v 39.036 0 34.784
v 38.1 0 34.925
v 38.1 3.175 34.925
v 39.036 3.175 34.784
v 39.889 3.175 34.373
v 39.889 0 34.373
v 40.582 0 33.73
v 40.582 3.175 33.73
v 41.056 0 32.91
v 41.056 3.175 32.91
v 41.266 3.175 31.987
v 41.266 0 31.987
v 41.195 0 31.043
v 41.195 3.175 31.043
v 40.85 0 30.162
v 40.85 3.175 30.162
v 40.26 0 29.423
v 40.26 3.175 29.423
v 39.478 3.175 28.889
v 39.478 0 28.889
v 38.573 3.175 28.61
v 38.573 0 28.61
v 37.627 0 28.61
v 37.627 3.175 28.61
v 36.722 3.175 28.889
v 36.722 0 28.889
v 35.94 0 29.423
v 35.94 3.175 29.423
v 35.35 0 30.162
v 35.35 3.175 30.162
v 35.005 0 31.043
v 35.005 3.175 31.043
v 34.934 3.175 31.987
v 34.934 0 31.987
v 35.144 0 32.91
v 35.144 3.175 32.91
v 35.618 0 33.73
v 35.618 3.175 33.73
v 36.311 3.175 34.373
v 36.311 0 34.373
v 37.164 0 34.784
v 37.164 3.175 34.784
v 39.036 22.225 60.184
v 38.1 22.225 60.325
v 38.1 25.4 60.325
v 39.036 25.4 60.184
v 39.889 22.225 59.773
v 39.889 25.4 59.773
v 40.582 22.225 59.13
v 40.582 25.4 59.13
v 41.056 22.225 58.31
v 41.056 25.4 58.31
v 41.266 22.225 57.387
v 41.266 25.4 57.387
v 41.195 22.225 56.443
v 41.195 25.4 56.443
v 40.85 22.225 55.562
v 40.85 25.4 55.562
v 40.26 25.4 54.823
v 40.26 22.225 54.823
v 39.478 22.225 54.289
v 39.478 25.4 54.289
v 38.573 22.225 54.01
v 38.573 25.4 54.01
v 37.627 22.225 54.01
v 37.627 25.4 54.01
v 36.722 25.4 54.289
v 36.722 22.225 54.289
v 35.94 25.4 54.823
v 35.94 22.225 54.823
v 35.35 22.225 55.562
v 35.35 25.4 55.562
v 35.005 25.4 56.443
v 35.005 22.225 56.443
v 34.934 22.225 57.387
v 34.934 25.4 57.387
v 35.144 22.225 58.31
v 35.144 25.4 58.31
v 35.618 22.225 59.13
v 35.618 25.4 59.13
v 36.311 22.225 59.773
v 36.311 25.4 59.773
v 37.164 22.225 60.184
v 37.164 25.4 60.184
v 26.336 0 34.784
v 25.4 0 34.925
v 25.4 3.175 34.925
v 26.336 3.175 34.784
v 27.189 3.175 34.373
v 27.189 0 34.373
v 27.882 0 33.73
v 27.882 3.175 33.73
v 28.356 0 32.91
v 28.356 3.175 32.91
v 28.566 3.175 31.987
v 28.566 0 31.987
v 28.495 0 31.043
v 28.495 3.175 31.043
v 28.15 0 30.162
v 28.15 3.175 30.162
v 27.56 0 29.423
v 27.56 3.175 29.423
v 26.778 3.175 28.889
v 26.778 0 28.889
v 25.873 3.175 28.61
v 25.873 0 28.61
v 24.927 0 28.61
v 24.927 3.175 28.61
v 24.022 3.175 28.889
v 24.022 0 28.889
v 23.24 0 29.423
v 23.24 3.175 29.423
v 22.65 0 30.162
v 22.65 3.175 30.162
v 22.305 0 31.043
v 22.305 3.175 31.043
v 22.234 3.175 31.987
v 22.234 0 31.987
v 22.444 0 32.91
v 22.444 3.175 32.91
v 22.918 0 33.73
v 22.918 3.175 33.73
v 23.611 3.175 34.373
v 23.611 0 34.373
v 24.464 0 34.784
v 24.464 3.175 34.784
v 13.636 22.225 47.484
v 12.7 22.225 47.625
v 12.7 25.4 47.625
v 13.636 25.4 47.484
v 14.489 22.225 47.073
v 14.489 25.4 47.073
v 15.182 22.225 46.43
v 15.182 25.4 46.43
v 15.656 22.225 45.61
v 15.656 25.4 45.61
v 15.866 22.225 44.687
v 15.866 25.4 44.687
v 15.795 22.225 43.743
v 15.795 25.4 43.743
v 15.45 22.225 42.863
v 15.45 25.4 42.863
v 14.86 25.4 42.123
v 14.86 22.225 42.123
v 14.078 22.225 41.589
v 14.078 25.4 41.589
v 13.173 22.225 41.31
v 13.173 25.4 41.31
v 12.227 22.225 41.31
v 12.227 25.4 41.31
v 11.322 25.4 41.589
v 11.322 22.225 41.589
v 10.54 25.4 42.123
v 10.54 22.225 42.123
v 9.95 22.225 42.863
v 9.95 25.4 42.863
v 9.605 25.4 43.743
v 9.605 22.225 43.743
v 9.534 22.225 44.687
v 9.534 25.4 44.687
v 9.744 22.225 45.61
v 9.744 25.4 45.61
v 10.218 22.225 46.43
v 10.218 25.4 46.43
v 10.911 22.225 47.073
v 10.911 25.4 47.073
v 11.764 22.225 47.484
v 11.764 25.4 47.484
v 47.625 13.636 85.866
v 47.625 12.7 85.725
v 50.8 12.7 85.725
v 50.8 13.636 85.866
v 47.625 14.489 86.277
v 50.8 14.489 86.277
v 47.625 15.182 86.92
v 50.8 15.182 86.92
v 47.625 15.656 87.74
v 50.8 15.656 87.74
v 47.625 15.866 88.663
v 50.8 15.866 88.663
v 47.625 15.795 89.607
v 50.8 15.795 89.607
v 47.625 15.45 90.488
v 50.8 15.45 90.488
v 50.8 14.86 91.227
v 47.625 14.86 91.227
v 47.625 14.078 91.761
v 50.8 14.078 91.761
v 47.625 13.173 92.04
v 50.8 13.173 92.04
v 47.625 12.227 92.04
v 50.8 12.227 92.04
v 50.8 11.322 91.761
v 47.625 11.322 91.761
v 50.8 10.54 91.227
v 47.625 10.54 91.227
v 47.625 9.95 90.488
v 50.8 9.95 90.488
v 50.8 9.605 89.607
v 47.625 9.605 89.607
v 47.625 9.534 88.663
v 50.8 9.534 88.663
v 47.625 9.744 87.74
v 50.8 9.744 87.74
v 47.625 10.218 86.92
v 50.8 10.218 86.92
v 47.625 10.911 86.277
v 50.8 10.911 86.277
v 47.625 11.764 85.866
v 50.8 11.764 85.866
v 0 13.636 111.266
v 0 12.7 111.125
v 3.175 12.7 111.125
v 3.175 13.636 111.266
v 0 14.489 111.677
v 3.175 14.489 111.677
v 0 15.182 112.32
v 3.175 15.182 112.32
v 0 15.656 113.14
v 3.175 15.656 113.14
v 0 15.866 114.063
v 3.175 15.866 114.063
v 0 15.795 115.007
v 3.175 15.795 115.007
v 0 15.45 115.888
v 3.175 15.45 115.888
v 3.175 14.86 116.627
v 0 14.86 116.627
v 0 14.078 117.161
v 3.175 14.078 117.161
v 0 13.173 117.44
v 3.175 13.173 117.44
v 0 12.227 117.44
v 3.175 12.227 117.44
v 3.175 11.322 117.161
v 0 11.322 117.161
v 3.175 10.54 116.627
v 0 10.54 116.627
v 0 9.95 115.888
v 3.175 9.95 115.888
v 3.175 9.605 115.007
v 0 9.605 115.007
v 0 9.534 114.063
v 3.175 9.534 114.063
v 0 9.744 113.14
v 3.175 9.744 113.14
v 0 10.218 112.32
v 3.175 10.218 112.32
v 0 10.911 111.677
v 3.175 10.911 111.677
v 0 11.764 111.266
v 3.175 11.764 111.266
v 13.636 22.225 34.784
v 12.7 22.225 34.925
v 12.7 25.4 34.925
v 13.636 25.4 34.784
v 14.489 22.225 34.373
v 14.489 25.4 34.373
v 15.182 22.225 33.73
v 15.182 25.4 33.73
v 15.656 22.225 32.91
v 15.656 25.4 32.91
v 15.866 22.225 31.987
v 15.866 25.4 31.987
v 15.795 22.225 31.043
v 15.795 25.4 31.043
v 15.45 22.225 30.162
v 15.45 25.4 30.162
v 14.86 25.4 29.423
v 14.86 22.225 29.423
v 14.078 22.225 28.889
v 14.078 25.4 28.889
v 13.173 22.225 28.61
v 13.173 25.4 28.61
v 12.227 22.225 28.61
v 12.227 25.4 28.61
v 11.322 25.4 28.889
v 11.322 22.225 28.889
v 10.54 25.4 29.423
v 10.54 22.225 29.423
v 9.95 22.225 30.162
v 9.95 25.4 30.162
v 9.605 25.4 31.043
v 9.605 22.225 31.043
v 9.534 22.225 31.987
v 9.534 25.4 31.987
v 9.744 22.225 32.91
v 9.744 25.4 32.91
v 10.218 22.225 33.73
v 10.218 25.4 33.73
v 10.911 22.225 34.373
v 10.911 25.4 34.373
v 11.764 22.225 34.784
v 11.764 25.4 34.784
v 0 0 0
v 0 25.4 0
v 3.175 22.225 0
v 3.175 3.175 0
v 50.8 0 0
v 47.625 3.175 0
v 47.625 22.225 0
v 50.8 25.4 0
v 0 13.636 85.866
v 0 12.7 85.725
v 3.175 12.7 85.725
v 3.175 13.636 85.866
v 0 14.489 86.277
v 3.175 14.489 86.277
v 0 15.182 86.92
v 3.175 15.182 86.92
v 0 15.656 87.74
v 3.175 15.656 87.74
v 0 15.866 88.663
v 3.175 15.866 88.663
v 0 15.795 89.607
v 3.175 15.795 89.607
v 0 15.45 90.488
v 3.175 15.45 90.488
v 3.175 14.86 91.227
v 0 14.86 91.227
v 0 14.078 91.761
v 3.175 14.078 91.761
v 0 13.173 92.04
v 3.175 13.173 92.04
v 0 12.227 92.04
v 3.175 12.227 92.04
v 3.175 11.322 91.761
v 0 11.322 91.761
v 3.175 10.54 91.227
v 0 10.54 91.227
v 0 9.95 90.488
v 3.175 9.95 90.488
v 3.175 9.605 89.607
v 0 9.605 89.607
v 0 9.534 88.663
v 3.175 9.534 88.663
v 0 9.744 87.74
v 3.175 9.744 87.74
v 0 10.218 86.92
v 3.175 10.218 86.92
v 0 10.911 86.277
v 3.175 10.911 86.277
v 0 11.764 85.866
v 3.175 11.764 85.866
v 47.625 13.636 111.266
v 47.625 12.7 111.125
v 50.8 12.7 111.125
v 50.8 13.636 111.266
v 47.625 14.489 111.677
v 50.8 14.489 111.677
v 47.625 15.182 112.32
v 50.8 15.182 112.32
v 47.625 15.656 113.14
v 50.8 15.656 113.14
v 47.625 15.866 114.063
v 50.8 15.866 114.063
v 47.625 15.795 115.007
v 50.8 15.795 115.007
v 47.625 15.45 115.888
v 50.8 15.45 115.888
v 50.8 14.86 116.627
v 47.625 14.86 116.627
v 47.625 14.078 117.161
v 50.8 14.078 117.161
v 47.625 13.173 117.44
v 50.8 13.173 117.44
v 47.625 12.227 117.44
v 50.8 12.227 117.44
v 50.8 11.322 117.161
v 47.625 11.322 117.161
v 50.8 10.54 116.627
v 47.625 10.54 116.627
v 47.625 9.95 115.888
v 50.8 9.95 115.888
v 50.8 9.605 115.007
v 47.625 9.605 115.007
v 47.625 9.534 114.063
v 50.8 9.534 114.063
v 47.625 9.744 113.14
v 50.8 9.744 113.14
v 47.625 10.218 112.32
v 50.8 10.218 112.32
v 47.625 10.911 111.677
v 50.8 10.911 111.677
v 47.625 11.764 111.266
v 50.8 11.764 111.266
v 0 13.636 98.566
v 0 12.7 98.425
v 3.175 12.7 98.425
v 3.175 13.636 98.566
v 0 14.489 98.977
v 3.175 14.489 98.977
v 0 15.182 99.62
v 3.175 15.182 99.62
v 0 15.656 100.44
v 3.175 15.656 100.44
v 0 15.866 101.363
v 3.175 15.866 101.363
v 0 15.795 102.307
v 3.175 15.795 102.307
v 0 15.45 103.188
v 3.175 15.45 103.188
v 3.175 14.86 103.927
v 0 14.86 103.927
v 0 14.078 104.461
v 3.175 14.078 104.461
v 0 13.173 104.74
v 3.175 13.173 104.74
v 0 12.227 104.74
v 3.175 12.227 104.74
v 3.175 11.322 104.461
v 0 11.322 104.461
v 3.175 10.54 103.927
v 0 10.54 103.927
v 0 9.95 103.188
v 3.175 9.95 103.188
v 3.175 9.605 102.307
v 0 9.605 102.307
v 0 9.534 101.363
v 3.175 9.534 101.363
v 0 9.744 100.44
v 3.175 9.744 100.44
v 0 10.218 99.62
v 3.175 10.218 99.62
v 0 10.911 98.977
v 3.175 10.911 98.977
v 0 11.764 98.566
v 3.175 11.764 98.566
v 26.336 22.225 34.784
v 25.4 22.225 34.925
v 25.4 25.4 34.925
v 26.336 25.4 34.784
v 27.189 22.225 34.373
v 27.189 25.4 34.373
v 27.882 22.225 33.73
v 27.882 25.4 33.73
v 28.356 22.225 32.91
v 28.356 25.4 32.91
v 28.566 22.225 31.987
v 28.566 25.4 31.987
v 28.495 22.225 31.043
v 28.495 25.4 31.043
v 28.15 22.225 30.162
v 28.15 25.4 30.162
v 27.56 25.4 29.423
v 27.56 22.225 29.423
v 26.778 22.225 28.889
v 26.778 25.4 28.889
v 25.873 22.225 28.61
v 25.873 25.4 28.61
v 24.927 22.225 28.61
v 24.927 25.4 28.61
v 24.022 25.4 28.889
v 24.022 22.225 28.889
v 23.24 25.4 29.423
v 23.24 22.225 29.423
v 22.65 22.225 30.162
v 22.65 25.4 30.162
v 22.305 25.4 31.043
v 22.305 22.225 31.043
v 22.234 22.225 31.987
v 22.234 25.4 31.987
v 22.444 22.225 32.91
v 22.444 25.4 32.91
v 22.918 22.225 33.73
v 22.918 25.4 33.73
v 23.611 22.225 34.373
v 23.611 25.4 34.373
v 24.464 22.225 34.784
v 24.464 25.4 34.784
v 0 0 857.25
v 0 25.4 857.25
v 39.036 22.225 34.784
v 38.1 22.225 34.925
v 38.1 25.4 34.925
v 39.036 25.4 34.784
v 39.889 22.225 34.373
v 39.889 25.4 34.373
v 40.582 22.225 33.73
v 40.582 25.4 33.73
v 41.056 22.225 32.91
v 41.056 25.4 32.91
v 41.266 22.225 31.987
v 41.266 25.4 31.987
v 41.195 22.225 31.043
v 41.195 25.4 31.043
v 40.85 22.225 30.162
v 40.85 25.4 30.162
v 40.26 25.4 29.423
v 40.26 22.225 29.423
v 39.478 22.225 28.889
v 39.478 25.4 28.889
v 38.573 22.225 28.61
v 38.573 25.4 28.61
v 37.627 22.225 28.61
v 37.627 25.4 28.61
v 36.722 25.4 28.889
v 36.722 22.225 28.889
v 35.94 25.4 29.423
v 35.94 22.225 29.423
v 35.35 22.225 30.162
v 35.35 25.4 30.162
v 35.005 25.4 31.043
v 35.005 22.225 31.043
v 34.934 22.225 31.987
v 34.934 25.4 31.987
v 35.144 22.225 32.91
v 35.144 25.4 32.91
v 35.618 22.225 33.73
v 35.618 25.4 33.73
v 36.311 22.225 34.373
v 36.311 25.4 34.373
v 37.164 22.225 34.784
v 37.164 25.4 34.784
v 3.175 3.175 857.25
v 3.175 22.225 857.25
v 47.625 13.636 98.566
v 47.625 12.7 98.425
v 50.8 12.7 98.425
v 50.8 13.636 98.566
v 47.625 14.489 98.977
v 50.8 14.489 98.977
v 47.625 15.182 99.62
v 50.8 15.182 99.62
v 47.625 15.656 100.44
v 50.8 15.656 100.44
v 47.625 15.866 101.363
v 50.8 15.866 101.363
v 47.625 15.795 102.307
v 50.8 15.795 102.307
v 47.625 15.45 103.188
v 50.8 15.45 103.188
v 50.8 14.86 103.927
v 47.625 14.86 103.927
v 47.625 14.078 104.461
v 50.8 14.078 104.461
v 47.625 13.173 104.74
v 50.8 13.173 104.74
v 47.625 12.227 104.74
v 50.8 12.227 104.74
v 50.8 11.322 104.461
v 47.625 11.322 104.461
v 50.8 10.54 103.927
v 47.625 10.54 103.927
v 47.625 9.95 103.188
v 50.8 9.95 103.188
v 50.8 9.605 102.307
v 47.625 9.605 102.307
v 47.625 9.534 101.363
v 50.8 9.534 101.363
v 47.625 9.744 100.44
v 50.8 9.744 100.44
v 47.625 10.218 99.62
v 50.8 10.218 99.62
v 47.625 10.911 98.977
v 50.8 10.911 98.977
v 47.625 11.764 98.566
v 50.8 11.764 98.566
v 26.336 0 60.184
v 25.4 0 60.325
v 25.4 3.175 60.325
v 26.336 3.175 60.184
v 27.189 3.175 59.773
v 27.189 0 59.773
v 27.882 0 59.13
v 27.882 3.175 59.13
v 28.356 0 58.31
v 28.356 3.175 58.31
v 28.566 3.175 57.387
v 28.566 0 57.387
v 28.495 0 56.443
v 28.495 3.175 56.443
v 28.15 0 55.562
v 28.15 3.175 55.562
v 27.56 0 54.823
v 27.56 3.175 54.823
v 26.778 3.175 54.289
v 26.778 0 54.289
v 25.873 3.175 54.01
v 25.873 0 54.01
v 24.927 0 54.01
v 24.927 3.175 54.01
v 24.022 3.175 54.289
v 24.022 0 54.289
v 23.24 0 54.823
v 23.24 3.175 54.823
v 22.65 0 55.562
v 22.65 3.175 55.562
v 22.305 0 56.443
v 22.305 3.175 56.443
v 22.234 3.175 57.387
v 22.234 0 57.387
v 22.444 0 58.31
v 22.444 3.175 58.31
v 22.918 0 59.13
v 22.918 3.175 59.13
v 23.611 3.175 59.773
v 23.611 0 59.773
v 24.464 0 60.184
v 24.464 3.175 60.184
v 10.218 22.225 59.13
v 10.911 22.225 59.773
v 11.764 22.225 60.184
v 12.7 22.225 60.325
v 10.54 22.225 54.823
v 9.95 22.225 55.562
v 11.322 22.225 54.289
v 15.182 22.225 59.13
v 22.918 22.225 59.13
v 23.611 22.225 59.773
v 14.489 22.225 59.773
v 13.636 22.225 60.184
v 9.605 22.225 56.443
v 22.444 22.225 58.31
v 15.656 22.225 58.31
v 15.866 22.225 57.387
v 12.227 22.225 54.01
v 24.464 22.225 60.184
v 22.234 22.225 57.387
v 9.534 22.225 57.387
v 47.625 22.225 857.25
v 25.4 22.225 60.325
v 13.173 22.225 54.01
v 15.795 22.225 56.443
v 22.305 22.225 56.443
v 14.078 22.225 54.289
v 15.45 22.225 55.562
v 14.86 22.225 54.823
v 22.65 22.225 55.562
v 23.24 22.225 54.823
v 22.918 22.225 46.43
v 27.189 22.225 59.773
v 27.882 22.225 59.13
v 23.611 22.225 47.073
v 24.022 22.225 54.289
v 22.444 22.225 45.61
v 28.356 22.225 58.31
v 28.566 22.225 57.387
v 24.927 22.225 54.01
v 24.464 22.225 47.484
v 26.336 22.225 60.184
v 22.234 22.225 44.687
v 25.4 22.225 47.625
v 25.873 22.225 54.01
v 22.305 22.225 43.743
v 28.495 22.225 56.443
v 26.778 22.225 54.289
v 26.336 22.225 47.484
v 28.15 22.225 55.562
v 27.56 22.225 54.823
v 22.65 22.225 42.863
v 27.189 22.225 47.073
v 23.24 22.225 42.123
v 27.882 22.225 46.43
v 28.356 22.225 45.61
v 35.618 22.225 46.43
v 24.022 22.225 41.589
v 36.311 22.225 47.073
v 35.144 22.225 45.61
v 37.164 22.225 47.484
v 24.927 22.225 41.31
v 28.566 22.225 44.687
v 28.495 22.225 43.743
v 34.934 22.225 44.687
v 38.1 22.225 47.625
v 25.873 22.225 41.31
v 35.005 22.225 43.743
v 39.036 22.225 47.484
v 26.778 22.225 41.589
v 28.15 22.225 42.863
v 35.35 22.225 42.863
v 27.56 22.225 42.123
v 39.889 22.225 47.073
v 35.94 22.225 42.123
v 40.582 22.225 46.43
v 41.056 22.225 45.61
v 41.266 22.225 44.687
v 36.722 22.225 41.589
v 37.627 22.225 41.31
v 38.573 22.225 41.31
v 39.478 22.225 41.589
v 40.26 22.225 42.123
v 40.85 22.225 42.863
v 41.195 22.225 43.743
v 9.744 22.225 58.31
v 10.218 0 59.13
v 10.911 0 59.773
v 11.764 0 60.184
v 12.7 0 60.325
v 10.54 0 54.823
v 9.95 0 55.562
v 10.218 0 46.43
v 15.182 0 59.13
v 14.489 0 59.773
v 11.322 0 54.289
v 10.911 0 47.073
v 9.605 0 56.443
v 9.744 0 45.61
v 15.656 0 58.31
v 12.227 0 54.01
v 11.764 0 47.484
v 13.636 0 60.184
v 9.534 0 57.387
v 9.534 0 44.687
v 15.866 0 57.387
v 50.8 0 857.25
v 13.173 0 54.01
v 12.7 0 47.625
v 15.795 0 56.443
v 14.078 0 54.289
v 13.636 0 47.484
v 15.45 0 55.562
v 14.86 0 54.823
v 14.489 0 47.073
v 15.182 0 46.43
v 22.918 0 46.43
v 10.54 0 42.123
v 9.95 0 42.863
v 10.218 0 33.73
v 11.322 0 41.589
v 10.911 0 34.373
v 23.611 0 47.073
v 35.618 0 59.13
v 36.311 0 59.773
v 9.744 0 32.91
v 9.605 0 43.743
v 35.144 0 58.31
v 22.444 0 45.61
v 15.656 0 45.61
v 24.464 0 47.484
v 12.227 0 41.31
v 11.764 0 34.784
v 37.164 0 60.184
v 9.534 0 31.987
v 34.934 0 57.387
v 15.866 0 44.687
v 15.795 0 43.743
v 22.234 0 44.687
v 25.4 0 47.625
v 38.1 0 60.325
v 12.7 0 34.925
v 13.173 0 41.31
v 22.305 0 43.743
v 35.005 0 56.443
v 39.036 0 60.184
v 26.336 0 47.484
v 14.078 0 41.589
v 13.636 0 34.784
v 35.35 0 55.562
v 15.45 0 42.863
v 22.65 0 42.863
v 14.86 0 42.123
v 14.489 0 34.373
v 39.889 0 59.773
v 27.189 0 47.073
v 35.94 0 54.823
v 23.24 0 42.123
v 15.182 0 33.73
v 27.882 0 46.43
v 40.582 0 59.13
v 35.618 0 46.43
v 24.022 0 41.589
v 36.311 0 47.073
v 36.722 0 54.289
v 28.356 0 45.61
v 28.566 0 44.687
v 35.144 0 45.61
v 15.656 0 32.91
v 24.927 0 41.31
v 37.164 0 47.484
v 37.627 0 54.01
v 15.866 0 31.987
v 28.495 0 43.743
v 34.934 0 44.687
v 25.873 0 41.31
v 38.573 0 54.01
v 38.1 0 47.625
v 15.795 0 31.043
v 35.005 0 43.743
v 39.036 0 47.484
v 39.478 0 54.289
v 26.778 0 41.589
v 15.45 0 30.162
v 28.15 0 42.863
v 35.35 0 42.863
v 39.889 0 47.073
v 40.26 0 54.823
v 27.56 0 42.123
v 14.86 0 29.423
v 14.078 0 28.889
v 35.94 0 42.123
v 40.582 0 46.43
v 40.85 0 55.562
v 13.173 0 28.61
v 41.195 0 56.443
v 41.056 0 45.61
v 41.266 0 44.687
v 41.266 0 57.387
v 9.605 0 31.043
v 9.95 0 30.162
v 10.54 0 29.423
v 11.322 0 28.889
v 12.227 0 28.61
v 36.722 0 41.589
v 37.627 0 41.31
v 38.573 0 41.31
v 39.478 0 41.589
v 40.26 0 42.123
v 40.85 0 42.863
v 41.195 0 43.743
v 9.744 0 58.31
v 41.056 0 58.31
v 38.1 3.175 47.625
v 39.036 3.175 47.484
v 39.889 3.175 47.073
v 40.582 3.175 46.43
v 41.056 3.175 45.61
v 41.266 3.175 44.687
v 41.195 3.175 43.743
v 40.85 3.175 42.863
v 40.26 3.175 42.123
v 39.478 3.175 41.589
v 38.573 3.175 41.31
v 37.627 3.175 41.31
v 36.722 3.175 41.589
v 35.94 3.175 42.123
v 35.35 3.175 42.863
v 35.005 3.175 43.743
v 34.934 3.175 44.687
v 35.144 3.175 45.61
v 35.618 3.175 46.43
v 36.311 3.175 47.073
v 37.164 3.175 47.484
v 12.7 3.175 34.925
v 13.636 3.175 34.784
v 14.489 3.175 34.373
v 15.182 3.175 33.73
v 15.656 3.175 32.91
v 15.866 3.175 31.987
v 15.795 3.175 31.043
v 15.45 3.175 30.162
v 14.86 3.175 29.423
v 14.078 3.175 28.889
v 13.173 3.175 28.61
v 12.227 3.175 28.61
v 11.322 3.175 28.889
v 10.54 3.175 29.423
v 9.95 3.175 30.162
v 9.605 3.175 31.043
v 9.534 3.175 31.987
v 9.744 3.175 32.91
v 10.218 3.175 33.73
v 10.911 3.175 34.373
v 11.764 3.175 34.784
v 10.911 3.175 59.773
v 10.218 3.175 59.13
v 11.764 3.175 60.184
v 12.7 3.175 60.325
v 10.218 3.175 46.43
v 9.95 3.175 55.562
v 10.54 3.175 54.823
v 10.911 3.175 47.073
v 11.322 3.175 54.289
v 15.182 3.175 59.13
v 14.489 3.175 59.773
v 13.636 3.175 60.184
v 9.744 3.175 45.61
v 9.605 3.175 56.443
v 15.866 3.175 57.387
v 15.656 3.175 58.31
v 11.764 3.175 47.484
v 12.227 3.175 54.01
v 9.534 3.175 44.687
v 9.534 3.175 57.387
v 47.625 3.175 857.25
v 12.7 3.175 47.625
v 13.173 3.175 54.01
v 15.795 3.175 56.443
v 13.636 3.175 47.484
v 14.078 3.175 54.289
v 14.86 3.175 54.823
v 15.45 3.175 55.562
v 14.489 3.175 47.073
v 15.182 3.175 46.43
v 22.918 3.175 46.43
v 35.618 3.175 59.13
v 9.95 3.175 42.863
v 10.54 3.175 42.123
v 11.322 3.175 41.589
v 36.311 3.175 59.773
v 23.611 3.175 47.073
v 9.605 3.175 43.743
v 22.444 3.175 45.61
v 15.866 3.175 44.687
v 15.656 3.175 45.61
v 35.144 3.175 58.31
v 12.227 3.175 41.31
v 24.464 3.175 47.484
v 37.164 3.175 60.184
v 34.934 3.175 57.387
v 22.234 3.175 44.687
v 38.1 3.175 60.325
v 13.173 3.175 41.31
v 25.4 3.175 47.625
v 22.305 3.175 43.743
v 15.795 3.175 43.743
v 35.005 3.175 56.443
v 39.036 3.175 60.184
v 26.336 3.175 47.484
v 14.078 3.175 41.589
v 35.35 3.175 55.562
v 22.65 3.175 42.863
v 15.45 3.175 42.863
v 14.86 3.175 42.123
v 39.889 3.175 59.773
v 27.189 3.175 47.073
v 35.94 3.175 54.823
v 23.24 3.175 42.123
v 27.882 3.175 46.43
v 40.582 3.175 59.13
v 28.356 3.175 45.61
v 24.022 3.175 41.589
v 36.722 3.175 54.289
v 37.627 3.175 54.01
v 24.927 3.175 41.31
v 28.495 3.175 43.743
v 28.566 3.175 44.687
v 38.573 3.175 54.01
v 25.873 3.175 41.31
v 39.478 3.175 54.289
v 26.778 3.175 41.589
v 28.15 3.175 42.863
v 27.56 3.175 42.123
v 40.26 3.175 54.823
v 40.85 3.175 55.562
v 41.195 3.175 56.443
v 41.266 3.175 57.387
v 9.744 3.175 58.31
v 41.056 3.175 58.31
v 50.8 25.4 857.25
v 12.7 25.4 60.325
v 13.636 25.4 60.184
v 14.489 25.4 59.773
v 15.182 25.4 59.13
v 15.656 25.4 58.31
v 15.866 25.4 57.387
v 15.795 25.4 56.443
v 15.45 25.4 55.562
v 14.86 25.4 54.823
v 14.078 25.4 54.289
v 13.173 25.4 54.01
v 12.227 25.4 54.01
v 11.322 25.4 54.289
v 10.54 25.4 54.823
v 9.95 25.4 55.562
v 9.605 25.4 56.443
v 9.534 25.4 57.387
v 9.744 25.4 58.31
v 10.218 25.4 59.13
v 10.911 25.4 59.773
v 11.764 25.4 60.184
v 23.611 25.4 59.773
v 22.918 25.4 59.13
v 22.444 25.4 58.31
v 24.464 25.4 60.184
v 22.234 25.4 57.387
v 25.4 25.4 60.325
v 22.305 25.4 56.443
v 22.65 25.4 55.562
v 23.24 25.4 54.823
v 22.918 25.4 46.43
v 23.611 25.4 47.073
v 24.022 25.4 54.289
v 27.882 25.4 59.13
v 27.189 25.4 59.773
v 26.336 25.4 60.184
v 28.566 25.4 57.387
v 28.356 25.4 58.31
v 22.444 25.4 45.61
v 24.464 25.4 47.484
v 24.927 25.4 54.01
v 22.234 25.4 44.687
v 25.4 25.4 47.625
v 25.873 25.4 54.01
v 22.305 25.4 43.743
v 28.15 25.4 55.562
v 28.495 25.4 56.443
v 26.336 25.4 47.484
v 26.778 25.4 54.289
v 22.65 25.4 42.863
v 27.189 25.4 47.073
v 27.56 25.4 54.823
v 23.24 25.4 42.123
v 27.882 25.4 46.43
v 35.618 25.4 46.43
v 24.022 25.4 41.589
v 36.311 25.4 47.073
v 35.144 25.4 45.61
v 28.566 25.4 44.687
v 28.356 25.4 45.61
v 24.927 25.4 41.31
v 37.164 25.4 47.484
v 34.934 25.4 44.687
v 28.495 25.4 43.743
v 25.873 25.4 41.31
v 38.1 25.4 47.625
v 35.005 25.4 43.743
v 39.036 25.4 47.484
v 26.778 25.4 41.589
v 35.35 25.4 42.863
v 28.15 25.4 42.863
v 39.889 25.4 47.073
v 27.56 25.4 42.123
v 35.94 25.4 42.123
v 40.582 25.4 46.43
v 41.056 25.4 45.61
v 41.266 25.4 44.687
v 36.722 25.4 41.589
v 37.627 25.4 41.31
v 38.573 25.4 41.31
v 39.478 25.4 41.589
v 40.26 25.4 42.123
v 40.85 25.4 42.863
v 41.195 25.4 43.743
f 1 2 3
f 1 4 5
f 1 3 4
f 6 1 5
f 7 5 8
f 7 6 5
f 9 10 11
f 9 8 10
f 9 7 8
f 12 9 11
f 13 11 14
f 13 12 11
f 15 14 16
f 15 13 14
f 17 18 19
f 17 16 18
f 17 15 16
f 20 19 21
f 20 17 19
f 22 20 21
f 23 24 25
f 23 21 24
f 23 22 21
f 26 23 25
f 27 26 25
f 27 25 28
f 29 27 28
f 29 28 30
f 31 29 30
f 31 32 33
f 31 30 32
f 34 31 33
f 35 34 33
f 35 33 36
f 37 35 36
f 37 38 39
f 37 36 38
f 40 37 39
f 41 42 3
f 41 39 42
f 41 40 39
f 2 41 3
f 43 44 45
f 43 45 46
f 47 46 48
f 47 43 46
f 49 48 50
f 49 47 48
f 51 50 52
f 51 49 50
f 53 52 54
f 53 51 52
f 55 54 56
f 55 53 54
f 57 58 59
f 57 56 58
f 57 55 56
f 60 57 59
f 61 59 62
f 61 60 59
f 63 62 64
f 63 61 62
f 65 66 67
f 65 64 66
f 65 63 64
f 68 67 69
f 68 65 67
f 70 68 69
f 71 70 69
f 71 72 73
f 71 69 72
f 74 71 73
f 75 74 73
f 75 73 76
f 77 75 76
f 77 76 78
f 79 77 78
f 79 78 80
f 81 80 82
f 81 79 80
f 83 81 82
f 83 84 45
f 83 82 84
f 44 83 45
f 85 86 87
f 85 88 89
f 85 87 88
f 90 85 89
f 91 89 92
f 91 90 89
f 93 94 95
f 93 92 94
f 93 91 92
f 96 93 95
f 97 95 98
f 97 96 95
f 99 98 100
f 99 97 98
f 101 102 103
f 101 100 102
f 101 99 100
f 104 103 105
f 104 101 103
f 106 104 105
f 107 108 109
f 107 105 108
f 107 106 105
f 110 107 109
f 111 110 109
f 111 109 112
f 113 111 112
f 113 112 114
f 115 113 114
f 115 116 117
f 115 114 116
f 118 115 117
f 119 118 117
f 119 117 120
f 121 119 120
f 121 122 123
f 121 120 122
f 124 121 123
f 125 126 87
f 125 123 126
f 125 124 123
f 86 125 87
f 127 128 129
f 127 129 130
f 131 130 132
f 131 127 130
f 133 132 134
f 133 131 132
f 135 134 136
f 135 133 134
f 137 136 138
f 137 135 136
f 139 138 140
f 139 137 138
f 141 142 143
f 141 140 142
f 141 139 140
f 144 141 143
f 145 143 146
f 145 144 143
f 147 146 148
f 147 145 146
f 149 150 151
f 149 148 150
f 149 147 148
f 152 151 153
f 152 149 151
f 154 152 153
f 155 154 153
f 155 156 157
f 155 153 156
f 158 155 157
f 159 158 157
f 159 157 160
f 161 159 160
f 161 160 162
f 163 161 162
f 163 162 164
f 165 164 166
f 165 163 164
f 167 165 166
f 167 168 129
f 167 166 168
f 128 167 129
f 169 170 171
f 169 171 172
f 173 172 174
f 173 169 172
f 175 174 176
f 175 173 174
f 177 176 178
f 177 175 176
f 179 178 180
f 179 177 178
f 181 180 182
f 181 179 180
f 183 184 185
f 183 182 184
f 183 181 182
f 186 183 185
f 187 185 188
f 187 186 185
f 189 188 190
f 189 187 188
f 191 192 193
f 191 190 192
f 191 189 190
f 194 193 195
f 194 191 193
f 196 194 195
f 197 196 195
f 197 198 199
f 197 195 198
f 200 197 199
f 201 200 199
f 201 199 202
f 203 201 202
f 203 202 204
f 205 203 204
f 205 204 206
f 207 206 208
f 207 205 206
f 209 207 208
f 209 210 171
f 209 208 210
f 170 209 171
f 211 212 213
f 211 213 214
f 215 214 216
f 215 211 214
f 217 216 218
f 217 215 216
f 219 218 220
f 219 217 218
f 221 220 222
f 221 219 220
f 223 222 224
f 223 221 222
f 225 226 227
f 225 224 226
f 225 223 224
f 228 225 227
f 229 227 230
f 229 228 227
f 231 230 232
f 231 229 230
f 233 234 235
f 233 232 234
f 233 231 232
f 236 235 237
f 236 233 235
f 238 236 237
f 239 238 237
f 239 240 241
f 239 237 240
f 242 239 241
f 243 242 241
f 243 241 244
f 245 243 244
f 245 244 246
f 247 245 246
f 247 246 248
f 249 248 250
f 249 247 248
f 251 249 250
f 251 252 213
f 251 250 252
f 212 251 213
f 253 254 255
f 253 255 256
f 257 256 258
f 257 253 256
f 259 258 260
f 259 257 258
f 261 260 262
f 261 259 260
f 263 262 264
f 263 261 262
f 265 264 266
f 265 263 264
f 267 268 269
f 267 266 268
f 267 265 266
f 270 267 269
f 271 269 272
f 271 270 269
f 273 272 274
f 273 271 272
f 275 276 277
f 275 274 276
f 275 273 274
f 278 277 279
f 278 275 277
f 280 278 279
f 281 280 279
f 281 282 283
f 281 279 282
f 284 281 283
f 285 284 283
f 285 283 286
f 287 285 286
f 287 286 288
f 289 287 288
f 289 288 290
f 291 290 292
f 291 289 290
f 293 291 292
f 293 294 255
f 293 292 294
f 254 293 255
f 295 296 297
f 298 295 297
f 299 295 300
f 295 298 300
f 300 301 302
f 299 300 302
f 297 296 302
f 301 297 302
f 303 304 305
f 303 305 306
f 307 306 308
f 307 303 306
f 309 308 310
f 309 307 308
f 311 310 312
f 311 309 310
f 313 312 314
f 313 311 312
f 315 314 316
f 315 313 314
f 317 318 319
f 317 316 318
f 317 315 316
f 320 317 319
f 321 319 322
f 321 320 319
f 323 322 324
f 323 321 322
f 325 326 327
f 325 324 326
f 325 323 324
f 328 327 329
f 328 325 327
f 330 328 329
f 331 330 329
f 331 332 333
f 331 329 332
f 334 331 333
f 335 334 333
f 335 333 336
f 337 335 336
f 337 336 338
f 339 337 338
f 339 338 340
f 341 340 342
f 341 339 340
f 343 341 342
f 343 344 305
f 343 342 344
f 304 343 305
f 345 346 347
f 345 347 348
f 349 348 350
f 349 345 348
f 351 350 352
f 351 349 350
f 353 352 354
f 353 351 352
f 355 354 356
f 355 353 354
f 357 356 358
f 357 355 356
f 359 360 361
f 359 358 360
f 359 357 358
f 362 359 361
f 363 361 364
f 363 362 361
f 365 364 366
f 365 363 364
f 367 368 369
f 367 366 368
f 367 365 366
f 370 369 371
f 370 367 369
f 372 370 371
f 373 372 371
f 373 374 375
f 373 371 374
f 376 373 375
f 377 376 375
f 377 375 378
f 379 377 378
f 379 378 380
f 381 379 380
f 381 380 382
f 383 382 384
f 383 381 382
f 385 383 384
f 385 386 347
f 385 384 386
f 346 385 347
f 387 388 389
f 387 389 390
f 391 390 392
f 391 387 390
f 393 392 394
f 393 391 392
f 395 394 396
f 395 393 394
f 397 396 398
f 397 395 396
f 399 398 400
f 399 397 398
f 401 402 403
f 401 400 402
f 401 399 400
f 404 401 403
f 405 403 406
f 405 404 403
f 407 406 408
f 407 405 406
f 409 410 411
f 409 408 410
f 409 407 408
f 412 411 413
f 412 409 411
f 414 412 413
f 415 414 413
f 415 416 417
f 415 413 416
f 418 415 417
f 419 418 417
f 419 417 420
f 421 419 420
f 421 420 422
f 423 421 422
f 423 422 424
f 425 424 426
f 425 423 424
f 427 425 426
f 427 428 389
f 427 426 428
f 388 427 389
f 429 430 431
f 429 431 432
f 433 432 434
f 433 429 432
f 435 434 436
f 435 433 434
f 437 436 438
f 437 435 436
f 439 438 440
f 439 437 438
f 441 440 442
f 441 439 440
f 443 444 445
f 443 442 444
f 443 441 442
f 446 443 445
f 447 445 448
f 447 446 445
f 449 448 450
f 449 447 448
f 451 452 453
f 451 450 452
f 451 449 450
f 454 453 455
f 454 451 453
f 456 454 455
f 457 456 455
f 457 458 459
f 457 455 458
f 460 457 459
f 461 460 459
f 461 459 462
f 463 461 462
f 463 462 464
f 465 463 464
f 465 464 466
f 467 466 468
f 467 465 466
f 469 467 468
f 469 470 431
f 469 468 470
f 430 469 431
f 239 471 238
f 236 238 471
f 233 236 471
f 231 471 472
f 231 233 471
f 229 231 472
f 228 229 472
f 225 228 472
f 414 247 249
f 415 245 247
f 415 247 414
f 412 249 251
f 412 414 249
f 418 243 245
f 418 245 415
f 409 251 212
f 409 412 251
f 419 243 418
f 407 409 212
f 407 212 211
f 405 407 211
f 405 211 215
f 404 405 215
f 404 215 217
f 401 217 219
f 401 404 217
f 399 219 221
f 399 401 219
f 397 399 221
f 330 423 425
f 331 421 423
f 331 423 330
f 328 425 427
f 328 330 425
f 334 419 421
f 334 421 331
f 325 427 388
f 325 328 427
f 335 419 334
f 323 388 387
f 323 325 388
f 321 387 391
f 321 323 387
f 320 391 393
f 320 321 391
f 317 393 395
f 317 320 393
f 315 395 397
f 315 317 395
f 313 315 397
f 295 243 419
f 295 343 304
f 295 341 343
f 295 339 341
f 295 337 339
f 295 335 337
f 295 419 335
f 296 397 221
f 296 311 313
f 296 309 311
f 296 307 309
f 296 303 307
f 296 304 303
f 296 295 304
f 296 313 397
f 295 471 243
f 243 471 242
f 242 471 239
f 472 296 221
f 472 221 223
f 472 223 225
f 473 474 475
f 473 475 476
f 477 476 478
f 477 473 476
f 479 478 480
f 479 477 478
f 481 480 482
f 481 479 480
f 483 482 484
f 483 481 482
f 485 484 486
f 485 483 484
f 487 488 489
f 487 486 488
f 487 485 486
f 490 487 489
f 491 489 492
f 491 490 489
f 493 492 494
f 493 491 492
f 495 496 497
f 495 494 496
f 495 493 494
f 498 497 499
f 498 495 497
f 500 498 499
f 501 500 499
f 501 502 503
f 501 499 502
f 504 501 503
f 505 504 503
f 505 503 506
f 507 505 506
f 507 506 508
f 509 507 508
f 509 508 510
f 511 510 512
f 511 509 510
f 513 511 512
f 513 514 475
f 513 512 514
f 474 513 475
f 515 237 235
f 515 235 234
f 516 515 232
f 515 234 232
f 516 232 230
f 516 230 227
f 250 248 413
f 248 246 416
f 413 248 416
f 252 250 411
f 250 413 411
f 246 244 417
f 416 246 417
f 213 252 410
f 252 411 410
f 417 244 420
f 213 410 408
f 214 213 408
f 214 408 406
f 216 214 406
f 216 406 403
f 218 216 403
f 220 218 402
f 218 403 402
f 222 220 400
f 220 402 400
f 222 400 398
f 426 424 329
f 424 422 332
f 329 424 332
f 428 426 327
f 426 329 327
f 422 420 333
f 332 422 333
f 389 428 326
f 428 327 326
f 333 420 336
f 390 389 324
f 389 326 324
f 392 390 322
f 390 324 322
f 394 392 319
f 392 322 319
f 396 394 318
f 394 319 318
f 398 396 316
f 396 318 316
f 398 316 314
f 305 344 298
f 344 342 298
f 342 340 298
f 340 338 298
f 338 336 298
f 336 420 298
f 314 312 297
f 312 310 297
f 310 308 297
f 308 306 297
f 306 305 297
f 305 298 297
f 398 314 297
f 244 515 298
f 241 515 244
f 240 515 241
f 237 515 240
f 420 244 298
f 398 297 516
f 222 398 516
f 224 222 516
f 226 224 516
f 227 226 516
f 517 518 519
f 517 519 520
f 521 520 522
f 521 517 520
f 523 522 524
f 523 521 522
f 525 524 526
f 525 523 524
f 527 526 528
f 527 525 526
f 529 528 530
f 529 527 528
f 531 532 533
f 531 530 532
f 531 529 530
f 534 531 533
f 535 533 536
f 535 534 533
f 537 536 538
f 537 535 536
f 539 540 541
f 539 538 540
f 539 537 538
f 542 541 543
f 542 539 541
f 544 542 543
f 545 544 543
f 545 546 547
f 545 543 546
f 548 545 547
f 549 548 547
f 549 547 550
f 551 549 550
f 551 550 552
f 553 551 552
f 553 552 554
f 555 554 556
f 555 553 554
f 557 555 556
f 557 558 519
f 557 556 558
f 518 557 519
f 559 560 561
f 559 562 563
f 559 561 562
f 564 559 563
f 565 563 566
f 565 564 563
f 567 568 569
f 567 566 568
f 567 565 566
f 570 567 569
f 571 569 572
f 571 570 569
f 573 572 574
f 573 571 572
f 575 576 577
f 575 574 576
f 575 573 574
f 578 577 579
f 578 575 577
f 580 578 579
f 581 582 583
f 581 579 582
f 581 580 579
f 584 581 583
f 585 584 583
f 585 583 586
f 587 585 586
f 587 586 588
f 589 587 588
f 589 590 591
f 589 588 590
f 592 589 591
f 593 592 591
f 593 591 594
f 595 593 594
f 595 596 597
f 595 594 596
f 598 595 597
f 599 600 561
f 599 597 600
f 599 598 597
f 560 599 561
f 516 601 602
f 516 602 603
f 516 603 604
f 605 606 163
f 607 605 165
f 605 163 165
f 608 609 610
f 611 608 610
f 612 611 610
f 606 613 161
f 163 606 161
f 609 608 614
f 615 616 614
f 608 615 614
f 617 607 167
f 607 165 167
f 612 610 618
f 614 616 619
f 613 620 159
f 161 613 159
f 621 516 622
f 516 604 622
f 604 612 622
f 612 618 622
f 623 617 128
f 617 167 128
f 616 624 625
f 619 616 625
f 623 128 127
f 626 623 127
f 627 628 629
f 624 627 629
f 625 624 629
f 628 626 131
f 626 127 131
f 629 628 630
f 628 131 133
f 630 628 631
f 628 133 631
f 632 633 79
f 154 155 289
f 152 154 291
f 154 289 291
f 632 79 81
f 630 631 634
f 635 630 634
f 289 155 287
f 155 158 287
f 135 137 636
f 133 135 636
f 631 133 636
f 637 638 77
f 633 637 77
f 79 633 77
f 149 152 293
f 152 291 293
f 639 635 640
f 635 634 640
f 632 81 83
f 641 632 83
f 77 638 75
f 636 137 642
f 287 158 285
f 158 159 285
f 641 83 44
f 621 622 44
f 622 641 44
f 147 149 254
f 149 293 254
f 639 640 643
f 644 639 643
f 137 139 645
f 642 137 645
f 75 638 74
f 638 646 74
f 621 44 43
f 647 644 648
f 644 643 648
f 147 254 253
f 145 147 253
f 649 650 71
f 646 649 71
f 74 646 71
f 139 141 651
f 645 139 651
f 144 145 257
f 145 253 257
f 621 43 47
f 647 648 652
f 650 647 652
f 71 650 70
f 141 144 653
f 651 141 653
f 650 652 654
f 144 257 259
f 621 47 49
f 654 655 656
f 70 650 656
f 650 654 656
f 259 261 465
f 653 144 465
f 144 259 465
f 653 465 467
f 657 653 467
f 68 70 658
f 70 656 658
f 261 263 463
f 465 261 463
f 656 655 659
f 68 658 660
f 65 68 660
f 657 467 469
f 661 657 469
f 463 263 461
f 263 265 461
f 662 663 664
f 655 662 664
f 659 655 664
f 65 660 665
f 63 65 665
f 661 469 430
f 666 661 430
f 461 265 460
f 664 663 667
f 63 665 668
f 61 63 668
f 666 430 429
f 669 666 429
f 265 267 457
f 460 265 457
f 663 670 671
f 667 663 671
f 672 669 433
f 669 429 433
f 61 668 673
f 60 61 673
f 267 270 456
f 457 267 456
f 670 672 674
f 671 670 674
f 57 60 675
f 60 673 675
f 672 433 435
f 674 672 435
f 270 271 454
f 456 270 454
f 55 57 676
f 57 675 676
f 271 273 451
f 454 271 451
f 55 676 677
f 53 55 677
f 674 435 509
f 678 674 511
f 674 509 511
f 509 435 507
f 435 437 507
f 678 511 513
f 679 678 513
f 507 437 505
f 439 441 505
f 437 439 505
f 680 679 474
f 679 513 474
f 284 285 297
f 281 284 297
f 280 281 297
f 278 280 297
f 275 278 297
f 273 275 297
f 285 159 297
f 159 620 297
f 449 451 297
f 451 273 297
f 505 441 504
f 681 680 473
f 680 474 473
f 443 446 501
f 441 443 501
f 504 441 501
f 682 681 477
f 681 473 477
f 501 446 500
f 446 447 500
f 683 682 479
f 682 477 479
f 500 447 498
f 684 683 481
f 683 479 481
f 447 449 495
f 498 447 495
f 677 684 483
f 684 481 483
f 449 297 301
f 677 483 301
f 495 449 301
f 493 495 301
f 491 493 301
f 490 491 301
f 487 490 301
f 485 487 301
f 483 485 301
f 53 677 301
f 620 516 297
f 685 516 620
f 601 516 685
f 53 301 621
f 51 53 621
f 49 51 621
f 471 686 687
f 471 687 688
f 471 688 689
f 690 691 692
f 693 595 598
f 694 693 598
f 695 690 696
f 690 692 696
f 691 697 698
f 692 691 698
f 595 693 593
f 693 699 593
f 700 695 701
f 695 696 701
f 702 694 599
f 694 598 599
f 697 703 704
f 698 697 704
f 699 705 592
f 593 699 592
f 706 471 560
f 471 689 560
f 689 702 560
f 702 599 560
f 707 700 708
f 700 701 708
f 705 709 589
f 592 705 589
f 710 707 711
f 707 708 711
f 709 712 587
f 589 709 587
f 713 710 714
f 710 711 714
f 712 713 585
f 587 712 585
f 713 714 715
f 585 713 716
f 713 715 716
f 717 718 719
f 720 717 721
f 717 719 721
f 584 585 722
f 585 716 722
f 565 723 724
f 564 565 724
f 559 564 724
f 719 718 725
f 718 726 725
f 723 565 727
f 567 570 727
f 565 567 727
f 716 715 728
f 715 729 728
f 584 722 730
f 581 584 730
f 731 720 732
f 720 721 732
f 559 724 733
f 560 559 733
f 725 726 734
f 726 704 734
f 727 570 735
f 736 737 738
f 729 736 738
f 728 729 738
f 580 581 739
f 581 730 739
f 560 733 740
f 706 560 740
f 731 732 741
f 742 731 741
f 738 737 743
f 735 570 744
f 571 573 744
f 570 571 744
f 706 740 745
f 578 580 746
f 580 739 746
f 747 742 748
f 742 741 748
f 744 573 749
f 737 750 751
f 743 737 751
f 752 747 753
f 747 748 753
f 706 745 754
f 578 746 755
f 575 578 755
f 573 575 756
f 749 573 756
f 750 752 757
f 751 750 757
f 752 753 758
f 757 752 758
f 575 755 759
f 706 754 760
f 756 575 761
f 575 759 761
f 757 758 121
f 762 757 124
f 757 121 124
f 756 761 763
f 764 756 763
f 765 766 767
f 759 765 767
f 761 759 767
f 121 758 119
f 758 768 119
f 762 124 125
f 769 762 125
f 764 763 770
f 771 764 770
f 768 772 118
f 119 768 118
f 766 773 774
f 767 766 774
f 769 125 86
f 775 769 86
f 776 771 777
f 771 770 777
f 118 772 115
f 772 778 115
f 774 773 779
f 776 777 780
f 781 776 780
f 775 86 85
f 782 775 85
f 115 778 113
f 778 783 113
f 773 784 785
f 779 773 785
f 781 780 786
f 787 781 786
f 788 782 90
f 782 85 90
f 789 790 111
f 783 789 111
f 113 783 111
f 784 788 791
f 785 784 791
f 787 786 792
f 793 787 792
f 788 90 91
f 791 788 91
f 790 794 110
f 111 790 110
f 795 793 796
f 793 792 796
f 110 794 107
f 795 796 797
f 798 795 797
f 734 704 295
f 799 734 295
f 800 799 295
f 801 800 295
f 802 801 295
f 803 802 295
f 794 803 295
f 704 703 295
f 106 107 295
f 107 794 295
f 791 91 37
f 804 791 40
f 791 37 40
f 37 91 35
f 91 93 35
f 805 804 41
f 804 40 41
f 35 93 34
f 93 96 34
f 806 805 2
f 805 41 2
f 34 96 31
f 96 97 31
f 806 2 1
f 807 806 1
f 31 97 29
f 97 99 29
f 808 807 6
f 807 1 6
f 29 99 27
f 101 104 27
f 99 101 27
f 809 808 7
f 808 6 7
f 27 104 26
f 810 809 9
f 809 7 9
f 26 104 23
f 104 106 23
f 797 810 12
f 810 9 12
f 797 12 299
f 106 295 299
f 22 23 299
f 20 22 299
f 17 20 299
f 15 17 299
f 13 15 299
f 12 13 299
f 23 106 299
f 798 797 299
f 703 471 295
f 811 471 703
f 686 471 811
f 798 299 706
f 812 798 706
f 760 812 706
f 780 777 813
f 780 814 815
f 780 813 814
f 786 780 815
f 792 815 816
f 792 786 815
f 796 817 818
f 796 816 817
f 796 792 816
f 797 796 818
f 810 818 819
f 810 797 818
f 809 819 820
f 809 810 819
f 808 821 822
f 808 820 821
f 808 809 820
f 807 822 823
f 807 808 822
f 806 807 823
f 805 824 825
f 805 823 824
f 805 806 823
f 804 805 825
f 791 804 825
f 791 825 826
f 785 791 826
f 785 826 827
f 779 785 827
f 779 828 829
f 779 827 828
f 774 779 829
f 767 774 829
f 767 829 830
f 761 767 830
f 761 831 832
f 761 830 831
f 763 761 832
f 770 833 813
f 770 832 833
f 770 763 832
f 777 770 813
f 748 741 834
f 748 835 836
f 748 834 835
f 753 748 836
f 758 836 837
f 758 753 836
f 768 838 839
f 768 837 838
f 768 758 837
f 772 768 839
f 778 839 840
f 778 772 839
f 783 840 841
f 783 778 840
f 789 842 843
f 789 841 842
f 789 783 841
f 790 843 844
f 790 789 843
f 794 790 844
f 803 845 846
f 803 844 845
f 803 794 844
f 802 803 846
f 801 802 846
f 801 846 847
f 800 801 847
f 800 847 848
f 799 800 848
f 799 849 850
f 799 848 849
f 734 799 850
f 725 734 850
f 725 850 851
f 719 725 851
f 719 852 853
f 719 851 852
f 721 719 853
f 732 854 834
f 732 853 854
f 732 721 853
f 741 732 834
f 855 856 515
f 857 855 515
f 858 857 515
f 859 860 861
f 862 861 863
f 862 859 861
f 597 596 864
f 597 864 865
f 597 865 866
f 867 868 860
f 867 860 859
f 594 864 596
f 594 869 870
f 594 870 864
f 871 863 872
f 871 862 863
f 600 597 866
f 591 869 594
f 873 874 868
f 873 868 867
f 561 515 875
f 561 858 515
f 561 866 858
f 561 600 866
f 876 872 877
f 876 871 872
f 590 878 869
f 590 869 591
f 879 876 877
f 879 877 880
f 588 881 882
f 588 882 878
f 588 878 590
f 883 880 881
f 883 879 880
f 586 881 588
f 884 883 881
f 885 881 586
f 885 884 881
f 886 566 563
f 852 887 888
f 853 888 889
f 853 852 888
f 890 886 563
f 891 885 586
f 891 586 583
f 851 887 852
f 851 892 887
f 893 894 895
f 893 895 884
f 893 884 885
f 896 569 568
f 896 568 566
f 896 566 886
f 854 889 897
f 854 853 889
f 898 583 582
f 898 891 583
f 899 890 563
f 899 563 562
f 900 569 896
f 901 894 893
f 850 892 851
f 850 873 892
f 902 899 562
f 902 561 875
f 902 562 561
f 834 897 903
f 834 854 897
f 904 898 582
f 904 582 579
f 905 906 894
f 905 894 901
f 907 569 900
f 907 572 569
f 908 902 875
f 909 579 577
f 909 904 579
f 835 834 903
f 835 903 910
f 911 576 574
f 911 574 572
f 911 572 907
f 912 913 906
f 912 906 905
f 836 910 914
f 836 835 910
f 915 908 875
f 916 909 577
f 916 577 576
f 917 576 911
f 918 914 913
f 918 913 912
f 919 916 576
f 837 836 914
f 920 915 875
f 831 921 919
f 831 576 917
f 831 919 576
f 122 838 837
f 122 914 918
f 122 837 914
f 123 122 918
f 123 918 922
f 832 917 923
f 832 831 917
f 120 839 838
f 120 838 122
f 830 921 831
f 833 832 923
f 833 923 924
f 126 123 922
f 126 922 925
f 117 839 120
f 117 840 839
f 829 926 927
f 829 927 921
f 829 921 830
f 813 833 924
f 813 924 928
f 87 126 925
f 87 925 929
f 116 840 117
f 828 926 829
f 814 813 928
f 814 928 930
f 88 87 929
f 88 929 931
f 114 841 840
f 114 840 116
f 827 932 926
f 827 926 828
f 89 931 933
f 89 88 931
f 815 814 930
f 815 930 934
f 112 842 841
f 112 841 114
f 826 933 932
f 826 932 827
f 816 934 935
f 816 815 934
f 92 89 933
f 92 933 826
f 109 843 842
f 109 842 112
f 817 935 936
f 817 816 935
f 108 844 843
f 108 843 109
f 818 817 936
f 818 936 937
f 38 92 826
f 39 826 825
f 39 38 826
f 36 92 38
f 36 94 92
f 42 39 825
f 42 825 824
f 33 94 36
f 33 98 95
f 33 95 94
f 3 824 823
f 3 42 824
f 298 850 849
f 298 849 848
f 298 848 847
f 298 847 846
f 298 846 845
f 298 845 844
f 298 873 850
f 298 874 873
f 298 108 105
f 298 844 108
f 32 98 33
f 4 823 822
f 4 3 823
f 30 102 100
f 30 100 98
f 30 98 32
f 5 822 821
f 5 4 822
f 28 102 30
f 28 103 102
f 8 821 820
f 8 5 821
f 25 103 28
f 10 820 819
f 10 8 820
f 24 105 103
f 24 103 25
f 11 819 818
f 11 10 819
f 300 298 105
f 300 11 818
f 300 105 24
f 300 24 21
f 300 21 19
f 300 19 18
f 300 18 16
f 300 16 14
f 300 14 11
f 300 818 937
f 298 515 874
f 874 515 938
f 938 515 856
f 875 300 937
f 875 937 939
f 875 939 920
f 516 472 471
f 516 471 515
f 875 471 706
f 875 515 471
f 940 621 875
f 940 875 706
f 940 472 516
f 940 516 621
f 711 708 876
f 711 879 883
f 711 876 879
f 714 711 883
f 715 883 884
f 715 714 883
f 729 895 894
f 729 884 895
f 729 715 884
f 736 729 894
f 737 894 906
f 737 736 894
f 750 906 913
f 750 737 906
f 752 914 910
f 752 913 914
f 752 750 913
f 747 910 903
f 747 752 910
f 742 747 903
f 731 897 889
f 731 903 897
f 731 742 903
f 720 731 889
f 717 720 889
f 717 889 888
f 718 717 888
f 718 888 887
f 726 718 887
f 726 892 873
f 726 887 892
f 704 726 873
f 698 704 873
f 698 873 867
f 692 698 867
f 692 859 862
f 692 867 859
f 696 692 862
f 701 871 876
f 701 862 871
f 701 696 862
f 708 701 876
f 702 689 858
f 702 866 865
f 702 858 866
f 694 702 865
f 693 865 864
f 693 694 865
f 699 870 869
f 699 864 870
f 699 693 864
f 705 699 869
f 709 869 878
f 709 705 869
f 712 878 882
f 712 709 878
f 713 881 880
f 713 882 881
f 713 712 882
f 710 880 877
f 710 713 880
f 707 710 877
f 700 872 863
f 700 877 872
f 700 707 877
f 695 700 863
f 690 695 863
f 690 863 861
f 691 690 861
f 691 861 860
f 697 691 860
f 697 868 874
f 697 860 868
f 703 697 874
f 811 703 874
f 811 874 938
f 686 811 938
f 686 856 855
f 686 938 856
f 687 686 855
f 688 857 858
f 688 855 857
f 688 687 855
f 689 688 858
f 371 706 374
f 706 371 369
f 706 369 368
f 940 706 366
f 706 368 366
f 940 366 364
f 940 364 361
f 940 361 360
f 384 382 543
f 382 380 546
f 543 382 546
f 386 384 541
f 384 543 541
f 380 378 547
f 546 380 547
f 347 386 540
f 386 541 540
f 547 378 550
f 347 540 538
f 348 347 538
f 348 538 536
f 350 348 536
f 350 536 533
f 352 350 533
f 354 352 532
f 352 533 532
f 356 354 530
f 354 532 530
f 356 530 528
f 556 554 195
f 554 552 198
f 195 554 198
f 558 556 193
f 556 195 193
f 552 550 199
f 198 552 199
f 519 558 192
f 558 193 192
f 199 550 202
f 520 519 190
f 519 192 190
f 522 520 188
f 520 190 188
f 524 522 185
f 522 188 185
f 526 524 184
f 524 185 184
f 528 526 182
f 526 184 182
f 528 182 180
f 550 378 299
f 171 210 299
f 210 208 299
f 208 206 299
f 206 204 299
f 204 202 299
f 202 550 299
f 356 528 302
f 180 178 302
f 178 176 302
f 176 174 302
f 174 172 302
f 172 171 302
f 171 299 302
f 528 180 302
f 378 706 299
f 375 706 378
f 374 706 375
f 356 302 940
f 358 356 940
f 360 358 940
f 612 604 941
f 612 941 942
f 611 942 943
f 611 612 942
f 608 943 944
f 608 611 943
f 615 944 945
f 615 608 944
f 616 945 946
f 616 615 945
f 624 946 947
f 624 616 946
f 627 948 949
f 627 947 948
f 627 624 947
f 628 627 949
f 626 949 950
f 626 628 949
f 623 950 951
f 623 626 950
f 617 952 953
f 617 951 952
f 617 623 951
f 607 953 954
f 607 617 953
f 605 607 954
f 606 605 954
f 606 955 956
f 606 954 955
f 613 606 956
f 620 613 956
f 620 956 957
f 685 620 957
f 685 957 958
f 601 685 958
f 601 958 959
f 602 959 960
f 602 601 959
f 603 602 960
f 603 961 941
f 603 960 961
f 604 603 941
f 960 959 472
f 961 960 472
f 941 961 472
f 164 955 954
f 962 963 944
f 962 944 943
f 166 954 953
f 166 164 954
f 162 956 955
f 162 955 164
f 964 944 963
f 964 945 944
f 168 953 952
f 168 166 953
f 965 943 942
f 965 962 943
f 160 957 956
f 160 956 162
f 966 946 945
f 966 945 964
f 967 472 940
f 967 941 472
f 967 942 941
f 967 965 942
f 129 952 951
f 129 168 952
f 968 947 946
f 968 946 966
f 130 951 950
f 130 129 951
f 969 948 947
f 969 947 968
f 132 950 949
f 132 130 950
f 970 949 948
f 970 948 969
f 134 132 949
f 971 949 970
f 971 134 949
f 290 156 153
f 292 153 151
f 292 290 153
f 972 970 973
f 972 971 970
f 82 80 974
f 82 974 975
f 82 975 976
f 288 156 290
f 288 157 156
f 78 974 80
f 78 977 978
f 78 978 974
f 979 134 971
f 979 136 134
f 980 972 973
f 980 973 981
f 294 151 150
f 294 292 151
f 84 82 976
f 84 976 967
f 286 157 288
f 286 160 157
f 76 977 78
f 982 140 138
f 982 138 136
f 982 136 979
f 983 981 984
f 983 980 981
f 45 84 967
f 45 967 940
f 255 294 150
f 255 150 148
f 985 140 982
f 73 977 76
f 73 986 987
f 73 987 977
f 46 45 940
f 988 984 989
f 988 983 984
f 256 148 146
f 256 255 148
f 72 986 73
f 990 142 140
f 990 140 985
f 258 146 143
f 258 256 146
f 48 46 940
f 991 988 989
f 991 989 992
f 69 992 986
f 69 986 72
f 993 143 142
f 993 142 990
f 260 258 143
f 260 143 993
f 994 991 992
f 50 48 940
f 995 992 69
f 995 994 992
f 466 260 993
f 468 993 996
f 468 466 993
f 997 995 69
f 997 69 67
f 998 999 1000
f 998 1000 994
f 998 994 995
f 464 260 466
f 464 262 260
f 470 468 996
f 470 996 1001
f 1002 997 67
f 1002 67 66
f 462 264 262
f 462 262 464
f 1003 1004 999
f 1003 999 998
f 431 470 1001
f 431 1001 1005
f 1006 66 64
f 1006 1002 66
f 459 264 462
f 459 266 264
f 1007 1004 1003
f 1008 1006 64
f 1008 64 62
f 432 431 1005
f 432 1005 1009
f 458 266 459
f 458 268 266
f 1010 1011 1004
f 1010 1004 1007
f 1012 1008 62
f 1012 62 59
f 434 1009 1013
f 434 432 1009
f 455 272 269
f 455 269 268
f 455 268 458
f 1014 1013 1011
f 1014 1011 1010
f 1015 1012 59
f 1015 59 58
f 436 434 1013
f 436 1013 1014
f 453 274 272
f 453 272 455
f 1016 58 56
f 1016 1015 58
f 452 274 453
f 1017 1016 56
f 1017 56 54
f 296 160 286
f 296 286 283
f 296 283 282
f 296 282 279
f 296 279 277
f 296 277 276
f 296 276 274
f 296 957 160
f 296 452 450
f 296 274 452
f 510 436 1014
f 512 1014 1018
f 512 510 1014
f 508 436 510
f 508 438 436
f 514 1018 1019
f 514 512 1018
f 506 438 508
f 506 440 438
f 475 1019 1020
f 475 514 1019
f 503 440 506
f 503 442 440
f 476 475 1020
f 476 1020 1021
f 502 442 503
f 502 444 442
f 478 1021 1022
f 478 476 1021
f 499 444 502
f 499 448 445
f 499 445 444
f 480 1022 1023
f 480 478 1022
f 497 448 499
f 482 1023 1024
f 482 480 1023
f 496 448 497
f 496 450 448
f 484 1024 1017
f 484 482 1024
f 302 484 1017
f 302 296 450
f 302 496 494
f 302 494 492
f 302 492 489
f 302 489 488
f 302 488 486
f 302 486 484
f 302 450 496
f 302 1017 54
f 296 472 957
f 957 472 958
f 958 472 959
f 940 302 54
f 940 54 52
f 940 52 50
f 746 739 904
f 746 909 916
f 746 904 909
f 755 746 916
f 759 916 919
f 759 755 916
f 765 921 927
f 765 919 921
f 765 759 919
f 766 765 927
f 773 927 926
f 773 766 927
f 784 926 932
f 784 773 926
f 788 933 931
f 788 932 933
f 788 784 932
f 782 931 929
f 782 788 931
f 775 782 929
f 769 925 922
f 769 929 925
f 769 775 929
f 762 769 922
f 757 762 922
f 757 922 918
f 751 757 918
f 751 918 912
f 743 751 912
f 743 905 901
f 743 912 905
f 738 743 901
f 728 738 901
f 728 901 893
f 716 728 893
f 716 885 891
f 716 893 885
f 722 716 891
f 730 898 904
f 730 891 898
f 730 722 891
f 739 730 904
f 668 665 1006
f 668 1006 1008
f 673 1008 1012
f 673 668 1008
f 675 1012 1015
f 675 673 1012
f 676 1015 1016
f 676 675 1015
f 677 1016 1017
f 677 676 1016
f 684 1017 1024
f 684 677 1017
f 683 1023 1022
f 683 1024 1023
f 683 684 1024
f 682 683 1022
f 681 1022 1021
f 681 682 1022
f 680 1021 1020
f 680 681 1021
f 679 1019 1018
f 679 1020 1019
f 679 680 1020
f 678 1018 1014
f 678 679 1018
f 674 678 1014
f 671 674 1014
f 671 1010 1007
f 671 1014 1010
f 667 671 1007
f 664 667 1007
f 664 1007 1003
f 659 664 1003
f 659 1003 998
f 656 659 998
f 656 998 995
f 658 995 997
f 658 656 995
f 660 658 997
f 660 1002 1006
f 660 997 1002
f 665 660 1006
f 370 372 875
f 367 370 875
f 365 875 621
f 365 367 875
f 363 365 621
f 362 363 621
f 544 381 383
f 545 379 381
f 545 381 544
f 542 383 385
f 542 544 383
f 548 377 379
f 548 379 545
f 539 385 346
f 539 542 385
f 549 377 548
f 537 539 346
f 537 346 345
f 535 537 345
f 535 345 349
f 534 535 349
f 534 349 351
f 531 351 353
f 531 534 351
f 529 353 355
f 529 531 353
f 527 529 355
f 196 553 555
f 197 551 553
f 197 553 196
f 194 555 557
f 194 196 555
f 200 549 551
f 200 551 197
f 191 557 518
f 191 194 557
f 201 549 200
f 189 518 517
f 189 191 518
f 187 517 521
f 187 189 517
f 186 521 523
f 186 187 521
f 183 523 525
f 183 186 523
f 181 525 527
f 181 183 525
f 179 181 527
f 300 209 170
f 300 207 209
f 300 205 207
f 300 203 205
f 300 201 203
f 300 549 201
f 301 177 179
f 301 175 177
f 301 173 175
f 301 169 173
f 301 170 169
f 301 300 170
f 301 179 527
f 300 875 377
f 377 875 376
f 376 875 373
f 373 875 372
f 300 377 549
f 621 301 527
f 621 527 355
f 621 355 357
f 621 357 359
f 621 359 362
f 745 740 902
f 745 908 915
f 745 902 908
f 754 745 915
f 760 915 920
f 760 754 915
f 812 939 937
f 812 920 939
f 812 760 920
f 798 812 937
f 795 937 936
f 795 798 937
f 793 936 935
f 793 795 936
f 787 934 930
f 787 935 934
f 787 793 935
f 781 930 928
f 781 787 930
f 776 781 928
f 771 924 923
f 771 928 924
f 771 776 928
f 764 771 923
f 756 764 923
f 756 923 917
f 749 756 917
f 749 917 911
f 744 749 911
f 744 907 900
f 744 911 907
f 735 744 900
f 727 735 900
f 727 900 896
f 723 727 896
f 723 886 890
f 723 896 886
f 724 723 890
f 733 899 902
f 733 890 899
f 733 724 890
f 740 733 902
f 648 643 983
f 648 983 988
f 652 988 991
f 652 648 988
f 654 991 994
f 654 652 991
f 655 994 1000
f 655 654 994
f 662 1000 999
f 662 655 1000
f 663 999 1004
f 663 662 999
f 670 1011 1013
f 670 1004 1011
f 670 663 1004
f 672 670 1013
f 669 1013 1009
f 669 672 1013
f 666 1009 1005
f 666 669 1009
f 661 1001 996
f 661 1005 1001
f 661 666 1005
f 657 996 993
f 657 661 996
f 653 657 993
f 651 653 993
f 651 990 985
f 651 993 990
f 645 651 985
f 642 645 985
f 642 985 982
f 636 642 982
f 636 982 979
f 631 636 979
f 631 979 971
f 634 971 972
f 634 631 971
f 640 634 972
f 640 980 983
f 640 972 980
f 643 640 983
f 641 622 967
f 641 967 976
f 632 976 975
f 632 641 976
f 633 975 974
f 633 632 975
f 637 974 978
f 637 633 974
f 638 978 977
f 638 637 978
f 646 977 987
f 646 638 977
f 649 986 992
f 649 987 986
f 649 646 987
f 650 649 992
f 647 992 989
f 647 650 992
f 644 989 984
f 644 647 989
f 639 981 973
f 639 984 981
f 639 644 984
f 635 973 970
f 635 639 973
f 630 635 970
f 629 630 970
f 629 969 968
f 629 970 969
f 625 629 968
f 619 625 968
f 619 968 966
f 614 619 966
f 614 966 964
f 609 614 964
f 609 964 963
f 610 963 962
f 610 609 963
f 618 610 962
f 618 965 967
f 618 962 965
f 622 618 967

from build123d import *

# Parameters (mm, degrees)
SKETCH1_W               = 50.8
SKETCH1_H               = 25.4
SKETCH1_W_2             = 44.45
SKETCH1_H_2             = 19.05
BOSS_EXTRUDE1_DEPTH     = 857.25
CUT_EXTRUDE1_DEPTH      = 860.129421275
CUT_EXTRUDE1_DEPTH_BACK = 860.129421275
SKETCH2_R               = 3.175
CUT_EXTRUDE2_DEPTH      = 860.129421275
CUT_EXTRUDE2_DEPTH_BACK = 860.129421275
SKETCH3_R               = 3.175


with BuildPart() as part:
    # Sketch1 → Boss-Extrude1 (new body)
    with BuildSketch(Plane.XY):
        with Locations((25.4, 12.7)):
            Rectangle(SKETCH1_W, SKETCH1_H)
        with Locations((25.4, 12.7)):
            Rectangle(SKETCH1_W_2, SKETCH1_H_2, mode=Mode.SUBTRACT)
    extrude(amount=BOSS_EXTRUDE1_DEPTH)

    # Sketch2 → Cut-Extrude1 (cut, two sides: drawn at the far end of the back side and taken through both)
    with BuildSketch(Plane(origin=(50.8, 0, 0), x_dir=(0, 0, -1), z_dir=(1, 0, 0)).offset(-CUT_EXTRUDE1_DEPTH_BACK)):
        with Locations((-88.9, 12.7)):
            Circle(SKETCH2_R)
        with Locations((-101.6, 12.7)):
            Circle(SKETCH2_R)
        with Locations((-114.3, 12.7)):
            Circle(SKETCH2_R)
    extrude(amount=CUT_EXTRUDE1_DEPTH + CUT_EXTRUDE1_DEPTH_BACK, mode=Mode.SUBTRACT)

    # Sketch3 → Cut-Extrude2 (cut, two sides: drawn at the far end of the back side and taken through both)
    with BuildSketch(Plane(origin=(0, 25.4, 0), x_dir=(1, 0, 0), z_dir=(0, 1, 0)).offset(-CUT_EXTRUDE2_DEPTH_BACK)):
        with Locations(Location((12.7, -31.75, 0), (0, 0, 270))):
            Circle(SKETCH3_R)
        with Locations(Location((25.4, -31.75, 0), (0, 0, 270))):
            Circle(SKETCH3_R)
        with Locations(Location((38.1, -31.75, 0), (0, 0, 270))):
            Circle(SKETCH3_R)
        with Locations(Location((25.4, -44.45, 0), (0, 0, 270))):
            Circle(SKETCH3_R)
        with Locations(Location((38.1, -44.45, 0), (0, 0, 270))):
            Circle(SKETCH3_R)
        with Locations(Location((25.4, -57.15, 0), (0, 0, 270))):
            Circle(SKETCH3_R)
        with Locations(Location((38.1, -57.15, 0), (0, 0, 270))):
            Circle(SKETCH3_R)
        with Locations(Location((12.7, -44.45, 0), (0, 0, 270))):
            Circle(SKETCH3_R)
        with Locations(Location((12.7, -57.15, 0), (0, 0, 270))):
            Circle(SKETCH3_R)
    extrude(amount=CUT_EXTRUDE2_DEPTH + CUT_EXTRUDE2_DEPTH_BACK, mode=Mode.SUBTRACT)


solid = part.part
